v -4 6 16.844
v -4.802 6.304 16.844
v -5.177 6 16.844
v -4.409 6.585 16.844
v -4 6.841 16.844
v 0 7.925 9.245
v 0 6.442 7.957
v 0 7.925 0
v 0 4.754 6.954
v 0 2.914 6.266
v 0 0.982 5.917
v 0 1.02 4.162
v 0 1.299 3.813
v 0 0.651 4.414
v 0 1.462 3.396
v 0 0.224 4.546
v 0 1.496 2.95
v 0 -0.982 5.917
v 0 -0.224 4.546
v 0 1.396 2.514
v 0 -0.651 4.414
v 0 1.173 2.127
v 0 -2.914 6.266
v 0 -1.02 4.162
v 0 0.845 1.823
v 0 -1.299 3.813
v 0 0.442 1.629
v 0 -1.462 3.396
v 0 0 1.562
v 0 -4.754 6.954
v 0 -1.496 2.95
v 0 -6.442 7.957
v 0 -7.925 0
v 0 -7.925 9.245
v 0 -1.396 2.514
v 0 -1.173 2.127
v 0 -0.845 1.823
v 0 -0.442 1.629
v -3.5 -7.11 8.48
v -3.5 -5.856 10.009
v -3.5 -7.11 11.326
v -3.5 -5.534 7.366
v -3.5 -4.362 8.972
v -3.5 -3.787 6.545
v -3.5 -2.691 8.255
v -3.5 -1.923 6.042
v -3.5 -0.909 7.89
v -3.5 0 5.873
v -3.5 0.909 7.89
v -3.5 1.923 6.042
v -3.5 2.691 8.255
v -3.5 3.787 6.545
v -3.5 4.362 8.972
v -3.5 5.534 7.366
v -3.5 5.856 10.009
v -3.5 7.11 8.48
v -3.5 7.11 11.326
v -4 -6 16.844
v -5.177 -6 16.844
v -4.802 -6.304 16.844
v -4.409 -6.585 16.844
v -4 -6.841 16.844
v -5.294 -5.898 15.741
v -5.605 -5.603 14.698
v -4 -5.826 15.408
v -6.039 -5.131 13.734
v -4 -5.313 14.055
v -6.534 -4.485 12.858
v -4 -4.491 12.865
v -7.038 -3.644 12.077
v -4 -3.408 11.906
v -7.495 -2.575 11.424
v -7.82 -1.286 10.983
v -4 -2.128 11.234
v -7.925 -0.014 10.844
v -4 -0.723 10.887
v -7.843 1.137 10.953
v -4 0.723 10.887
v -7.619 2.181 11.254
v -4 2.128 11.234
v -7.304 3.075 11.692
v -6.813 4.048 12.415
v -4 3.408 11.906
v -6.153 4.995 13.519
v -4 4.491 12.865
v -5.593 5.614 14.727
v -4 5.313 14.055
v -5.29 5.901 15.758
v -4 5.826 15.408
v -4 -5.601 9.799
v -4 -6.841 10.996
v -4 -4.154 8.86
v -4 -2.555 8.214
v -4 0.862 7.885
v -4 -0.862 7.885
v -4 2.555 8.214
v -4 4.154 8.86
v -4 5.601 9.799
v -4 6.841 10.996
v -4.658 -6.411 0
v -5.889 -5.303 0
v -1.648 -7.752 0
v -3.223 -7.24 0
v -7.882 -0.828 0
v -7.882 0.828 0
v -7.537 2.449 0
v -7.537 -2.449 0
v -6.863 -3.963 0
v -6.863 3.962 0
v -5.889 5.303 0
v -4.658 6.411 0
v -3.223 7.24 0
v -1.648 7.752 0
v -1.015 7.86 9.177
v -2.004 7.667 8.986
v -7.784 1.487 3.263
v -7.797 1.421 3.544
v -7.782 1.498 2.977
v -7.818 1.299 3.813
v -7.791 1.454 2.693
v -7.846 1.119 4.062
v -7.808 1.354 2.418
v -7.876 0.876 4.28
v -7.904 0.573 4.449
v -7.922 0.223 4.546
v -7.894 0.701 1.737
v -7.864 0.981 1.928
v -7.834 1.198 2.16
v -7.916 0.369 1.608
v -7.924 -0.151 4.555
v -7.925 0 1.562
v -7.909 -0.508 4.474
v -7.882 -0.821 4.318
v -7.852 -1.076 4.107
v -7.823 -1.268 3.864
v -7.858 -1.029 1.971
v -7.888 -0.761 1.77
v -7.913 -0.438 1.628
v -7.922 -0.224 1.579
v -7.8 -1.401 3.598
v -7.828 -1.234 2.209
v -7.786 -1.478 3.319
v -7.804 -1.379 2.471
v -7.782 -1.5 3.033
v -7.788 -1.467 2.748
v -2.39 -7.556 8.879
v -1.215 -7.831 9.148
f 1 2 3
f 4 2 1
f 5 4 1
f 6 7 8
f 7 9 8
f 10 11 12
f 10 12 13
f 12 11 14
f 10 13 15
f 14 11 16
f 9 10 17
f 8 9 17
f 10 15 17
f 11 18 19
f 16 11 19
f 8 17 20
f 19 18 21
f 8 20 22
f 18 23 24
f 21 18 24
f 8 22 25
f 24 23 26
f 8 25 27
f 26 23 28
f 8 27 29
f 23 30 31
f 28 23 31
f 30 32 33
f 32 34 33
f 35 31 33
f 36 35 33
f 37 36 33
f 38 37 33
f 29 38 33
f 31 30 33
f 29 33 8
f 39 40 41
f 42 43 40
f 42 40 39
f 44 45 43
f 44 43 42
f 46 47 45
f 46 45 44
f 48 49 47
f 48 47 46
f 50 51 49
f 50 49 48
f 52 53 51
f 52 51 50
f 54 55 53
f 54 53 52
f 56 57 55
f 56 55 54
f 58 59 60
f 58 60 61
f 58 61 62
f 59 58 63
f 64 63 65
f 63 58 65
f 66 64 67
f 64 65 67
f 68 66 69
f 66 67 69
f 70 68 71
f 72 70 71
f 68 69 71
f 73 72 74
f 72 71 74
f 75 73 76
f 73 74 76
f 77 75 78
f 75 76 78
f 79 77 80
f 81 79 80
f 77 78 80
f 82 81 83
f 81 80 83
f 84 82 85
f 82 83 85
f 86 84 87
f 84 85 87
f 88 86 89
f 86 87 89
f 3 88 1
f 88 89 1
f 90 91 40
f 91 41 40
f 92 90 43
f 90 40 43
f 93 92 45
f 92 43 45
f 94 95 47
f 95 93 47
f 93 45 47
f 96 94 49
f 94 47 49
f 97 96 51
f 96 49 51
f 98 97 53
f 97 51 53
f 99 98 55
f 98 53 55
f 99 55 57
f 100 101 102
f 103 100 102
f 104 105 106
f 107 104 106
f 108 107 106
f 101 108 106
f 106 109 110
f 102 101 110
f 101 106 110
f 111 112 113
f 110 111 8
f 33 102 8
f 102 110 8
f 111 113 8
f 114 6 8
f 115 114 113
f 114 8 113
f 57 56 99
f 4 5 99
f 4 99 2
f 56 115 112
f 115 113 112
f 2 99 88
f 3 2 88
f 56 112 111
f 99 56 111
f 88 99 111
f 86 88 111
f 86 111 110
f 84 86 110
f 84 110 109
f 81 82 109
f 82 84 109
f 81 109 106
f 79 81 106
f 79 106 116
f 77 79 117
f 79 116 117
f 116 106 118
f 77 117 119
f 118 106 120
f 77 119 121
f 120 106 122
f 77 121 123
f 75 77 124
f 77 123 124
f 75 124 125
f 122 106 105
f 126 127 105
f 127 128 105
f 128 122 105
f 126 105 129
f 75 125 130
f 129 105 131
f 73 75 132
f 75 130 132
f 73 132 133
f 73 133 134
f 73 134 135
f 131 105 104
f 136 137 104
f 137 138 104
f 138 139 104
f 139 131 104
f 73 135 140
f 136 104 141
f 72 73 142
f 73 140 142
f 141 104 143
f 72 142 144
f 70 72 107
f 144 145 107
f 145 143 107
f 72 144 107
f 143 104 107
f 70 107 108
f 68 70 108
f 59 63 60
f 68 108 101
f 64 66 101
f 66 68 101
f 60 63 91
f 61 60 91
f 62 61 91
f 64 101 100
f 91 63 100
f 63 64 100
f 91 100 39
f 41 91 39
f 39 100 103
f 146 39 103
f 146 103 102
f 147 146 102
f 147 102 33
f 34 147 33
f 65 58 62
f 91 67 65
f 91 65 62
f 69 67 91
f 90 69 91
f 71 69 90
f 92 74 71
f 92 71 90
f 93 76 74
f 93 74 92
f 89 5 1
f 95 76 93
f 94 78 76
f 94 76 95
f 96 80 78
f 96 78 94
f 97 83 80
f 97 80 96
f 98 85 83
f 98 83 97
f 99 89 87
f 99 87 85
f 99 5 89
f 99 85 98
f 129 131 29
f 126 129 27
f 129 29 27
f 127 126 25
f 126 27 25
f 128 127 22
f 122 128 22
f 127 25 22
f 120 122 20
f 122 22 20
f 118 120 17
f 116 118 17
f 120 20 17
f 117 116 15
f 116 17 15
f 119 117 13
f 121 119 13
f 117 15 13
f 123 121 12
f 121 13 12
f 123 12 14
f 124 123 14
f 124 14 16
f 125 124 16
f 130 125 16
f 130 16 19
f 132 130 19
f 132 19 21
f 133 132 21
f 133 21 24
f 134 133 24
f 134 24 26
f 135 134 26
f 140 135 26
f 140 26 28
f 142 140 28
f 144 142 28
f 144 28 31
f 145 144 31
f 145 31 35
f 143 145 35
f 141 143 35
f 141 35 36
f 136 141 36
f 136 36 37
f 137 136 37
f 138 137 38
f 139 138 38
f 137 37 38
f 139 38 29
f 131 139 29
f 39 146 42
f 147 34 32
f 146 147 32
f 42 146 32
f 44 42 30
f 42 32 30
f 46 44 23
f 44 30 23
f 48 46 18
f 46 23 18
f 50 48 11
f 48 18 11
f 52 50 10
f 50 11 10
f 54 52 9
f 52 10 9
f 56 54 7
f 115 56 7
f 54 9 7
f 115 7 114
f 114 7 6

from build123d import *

# Parameters (mm, degrees)
SKETCH1_R               = 7.925
EXTRUDE1_DEPTH          = 16.84375
CUT_EXTRUDE1_DEPTH      = 21.231736556
CUT_EXTRUDE1_DEPTH_BACK = 21.231736556
SKETCH2_W               = 7.925
SKETCH2_H               = 17
SKETCH3_R               = 11
CUT_EXTRUDE2_DEPTH      = 3.5
SKETCH6_R               = 9
CUT_EXTRUDE5_DEPTH      = 4
SKETCH7_R               = 6
SKETCH7_R_2             = 1.5
CUT_EXTRUDE6_DEPTH      = 21.231736717


with BuildPart() as part:
    # Sketch1 → Extrude1 (new body)
    with BuildSketch(Plane.XY):
        Circle(SKETCH1_R)
    extrude(amount=EXTRUDE1_DEPTH)

    # Sketch2 → Cut-Extrude1 (cut, two sides: drawn at the far end of the back side and taken through both)
    with BuildSketch(Plane(origin=(0, 0, 0), x_dir=(1, 0, 0), z_dir=(0, 1, 0)).offset(-CUT_EXTRUDE1_DEPTH_BACK)):
        with Locations((3.9625, -8.5)):
            Rectangle(SKETCH2_W, SKETCH2_H)
    extrude(amount=CUT_EXTRUDE1_DEPTH + CUT_EXTRUDE1_DEPTH_BACK, mode=Mode.SUBTRACT)

    # Sketch3 → Cut-Extrude2 (cut)
    with BuildSketch(Plane(origin=(0, 0, 0), x_dir=(0, 0, -1), z_dir=(1, 0, 0))):
        with Locations((-16.873106172, 0)):
            Circle(SKETCH3_R)
    extrude(amount=-CUT_EXTRUDE2_DEPTH, mode=Mode.SUBTRACT)

    # Sketch6 → Cut-Extrude5 (cut)
    with BuildSketch(Plane(origin=(0, 0, 0), x_dir=(0, 0, -1), z_dir=(1, 0, 0))):
        with Locations((-16.84375, 0)):
            Circle(SKETCH6_R)
    extrude(amount=-CUT_EXTRUDE5_DEPTH, mode=Mode.SUBTRACT)

    # Sketch7 → Cut-Extrude6 (cut, through all)
    with BuildSketch(Plane(origin=(0, 0, 0), x_dir=(0, 0, -1), z_dir=(1, 0, 0))):
        with Locations((-16.84375, 0)):
            Circle(SKETCH7_R)
        with Locations((-3.0625, 0)):
            Circle(SKETCH7_R_2)
    extrude(amount=-CUT_EXTRUDE6_DEPTH, mode=Mode.SUBTRACT)


solid = part.part
